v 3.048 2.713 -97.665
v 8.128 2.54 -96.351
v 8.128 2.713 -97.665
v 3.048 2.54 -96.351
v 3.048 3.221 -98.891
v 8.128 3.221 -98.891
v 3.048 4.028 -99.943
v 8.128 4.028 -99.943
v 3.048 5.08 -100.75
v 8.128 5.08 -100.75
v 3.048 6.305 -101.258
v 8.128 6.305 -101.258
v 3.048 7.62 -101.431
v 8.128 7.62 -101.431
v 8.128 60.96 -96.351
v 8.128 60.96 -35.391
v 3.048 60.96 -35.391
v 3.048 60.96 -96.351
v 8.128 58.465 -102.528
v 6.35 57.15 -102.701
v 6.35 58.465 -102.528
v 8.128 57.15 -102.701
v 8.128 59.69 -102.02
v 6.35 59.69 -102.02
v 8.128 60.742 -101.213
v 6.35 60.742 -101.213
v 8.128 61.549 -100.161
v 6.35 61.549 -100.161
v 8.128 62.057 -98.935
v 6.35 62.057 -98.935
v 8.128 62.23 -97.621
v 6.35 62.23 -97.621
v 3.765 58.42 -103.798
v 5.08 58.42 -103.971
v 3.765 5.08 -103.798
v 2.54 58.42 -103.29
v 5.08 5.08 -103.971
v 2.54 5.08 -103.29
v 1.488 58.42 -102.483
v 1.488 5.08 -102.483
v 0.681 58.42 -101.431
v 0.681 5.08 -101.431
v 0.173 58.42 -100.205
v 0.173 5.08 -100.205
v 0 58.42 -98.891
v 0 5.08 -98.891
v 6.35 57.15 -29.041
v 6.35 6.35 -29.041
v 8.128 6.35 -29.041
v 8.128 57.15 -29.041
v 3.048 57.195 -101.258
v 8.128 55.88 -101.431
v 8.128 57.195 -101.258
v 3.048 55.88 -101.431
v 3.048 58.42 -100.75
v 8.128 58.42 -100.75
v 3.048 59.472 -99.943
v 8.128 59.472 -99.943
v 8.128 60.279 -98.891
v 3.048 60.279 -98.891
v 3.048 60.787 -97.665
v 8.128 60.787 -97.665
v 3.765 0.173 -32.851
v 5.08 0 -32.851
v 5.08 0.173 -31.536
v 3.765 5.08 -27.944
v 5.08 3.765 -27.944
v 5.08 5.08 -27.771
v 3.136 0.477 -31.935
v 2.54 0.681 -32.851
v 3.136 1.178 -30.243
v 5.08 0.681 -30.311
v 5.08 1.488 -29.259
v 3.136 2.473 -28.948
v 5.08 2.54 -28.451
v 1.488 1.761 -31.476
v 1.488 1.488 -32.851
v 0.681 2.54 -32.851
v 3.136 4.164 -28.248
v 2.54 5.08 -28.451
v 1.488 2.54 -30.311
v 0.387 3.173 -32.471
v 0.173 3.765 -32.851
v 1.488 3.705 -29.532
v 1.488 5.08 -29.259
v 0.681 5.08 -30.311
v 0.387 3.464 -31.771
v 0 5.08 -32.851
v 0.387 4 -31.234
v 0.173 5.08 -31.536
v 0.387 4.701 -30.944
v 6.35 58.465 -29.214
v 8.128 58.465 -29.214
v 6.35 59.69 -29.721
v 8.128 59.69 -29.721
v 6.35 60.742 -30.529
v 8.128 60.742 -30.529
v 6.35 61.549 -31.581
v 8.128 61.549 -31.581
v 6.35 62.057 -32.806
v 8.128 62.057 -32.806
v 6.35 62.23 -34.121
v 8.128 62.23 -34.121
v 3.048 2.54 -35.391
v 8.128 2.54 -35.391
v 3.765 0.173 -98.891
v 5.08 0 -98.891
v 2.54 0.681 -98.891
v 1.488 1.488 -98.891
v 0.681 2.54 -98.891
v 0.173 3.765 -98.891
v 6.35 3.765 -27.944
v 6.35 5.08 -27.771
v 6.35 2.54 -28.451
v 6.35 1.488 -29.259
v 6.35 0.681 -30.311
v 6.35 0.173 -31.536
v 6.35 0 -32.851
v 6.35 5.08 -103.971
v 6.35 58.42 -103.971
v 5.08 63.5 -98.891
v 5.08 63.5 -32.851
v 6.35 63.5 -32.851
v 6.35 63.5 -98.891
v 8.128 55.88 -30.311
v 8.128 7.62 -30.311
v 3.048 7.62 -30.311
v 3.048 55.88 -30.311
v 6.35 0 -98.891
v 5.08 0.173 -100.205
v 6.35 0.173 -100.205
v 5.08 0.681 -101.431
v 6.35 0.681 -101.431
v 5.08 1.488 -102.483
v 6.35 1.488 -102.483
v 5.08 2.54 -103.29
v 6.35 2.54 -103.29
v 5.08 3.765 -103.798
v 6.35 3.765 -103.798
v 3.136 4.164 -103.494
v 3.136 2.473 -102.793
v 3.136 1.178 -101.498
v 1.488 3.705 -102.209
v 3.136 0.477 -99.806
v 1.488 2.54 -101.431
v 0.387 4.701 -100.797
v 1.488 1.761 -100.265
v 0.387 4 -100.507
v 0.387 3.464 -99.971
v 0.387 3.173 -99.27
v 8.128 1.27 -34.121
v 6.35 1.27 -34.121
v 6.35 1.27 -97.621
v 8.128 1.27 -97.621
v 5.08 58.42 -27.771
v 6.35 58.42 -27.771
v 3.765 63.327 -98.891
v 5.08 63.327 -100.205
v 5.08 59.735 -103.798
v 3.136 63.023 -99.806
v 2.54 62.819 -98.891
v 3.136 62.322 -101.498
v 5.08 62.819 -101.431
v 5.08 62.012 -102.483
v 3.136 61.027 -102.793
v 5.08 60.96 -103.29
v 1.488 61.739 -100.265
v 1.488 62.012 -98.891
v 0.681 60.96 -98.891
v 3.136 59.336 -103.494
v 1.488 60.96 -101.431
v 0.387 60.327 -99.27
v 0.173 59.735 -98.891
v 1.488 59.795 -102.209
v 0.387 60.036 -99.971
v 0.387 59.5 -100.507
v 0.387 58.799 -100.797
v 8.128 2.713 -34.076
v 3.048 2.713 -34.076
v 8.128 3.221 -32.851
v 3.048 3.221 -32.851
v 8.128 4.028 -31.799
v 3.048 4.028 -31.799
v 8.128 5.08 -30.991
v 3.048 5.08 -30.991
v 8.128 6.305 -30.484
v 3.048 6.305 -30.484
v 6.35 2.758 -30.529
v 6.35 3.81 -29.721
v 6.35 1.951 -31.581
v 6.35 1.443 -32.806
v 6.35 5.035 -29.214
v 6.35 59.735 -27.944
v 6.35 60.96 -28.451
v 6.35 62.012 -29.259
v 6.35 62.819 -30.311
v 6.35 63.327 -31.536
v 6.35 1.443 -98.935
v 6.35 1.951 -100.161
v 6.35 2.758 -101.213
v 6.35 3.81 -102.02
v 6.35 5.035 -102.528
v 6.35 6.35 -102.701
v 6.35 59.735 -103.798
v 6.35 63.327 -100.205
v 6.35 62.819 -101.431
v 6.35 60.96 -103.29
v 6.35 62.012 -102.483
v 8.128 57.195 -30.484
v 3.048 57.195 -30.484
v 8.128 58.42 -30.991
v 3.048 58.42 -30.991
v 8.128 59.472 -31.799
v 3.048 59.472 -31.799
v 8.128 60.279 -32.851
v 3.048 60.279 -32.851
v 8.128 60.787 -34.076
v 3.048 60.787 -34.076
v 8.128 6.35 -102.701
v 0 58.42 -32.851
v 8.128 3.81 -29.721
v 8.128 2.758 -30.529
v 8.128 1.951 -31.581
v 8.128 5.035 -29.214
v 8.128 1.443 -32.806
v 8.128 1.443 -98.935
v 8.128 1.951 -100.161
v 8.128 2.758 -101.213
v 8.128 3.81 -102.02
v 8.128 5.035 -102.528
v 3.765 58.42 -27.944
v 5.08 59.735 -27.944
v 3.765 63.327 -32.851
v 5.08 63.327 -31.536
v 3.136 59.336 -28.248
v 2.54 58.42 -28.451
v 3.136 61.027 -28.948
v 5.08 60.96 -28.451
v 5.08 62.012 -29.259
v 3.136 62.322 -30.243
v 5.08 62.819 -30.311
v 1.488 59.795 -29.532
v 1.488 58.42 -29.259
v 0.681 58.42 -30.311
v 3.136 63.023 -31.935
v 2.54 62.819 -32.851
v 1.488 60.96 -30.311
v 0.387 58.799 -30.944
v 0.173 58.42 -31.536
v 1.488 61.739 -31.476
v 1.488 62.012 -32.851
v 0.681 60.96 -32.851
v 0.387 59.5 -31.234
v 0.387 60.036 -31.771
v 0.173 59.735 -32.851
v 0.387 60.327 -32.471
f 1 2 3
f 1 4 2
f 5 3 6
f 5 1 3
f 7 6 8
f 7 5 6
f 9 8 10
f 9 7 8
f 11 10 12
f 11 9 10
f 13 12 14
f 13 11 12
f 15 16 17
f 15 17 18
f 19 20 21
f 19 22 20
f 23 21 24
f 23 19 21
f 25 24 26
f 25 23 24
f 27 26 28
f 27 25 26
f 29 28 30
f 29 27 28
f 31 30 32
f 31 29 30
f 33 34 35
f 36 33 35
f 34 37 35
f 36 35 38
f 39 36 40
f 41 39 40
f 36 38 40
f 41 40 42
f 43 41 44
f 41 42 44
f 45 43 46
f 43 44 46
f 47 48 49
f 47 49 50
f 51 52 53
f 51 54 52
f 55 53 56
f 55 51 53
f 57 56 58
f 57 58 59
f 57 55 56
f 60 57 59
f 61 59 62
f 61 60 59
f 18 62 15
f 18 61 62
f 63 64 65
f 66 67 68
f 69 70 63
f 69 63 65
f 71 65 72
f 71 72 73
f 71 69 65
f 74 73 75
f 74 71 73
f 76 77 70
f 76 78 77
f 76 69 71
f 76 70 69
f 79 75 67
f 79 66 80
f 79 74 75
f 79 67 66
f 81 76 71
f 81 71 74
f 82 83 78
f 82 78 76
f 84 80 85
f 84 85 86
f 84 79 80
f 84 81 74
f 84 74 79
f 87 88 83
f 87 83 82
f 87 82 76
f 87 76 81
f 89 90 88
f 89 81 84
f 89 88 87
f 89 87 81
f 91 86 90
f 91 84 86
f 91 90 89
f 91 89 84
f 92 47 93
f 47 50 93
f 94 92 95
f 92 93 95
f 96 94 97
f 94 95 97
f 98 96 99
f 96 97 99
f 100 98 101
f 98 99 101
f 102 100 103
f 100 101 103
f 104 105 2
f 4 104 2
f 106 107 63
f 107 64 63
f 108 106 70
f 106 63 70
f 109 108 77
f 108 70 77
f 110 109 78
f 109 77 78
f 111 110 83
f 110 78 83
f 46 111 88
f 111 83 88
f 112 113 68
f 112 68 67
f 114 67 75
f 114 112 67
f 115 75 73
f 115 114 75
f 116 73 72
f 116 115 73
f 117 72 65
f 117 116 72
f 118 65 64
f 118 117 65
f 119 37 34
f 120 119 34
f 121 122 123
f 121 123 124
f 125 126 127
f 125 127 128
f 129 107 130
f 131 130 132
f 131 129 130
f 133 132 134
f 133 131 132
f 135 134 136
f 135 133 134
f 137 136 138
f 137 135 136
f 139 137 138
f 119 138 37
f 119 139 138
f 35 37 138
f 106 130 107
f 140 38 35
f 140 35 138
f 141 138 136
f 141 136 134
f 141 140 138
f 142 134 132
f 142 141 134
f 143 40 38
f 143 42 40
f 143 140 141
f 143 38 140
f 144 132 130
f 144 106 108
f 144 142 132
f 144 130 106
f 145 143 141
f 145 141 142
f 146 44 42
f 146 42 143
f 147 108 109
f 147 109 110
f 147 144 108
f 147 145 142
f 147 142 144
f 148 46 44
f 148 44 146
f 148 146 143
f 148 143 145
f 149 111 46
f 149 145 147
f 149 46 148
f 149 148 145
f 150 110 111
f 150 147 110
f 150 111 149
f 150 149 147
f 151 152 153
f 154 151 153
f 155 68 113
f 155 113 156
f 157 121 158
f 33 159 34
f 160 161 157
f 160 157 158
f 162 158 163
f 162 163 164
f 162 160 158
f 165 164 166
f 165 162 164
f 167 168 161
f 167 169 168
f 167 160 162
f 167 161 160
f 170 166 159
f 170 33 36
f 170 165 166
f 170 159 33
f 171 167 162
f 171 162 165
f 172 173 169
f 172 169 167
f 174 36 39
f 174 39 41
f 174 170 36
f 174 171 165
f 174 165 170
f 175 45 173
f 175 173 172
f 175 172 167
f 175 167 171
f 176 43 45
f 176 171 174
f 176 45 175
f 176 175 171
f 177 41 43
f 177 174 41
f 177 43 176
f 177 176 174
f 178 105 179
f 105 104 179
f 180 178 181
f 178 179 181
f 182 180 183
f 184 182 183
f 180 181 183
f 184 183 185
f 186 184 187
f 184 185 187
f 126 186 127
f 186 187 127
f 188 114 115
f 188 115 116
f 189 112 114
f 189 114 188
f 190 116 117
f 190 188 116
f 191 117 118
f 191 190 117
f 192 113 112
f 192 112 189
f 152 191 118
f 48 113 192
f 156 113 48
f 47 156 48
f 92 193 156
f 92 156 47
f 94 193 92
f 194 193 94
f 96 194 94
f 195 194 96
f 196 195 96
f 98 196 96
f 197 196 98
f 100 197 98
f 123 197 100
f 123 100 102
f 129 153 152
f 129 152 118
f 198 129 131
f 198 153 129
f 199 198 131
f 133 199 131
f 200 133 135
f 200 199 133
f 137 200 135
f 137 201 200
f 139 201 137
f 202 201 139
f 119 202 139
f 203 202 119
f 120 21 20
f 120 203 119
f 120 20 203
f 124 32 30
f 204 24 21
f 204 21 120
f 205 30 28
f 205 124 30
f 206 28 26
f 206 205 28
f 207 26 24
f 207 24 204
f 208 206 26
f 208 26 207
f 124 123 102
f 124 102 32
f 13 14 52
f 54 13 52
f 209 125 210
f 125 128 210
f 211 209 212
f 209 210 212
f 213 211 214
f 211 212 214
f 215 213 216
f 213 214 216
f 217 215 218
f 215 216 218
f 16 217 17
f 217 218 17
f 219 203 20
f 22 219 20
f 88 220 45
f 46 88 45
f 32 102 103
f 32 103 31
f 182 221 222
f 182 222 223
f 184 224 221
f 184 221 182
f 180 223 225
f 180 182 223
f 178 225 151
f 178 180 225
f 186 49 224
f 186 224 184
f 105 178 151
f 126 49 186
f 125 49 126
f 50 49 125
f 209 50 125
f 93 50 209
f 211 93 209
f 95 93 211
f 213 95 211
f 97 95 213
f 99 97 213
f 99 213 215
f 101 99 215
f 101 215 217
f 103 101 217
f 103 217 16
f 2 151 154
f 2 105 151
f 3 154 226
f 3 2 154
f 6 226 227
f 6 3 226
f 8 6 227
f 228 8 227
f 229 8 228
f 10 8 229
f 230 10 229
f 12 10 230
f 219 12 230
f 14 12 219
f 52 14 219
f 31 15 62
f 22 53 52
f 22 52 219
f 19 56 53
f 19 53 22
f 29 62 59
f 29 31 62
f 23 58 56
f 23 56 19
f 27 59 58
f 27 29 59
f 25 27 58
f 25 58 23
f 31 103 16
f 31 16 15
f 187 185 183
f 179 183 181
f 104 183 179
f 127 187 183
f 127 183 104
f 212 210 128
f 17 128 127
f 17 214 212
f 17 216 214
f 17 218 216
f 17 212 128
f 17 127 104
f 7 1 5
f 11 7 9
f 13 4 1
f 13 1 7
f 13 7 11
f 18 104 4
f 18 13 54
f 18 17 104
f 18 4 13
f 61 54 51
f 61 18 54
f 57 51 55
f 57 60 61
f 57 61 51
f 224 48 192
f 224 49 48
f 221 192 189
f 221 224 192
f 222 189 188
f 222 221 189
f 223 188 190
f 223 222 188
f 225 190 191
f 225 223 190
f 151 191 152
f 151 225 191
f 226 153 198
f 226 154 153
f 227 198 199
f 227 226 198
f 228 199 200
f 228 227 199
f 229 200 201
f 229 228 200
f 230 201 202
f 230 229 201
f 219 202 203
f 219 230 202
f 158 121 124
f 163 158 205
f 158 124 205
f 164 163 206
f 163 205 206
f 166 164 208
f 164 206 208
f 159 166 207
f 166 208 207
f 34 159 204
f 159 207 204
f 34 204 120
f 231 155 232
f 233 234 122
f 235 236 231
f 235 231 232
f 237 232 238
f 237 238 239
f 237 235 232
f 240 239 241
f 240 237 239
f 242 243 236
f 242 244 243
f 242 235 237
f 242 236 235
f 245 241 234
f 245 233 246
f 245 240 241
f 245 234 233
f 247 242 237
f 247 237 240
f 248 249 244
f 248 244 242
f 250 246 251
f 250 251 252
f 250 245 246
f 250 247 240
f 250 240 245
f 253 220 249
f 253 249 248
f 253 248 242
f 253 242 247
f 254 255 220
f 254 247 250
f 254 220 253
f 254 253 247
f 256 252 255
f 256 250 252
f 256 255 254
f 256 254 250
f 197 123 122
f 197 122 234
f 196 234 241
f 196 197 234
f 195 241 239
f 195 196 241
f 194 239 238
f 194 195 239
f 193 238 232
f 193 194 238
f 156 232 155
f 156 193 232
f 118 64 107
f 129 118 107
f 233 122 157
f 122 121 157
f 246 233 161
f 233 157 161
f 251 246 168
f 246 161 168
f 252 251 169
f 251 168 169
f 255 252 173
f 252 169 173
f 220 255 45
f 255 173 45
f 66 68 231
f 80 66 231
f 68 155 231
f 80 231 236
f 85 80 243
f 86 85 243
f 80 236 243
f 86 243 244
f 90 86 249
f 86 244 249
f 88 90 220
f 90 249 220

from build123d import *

# Parameters (mm, degrees)
SKETCH5_W           = 76.2
SKETCH5_H           = 63.5
BOSS_EXTRUDE2_DEPTH = 6.35
SKETCH6_W           = 73.66
SKETCH6_H           = 60.96
BOSS_EXTRUDE3_DEPTH = 1.778
SKETCH7_W           = 71.12
SKETCH7_H           = 58.42
CUT_EXTRUDE2_DEPTH  = 5.08
FILLET7_R           = 5.08
FILLET8_R           = 5.08
FILLET9_R           = 5.08
FILLET10_R          = 5.08
FILLET11_R          = 5.08
FILLET12_R          = 5.08
FILLET13_R          = 5.08


with BuildPart() as part:
    # Sketch5 → Boss-Extrude2 (new body)
    with BuildSketch(Plane(origin=(0, 0, 0), x_dir=(0, 0, -1), z_dir=(1, 0, 0))):
        with Locations((65.870666667, 31.75)):
            Rectangle(SKETCH5_W, SKETCH5_H)
    extrude(amount=BOSS_EXTRUDE2_DEPTH)

    # Sketch6 → Boss-Extrude3 (add)
    with BuildSketch(Plane(origin=(6.35, 0, 0), x_dir=(0, 0, -1), z_dir=(1, 0, 0))):
        with Locations((65.870666667, 31.75)):
            Rectangle(SKETCH6_W, SKETCH6_H)
    extrude(amount=BOSS_EXTRUDE3_DEPTH)

    # Sketch7 → Cut-Extrude2 (cut)
    with BuildSketch(Plane(origin=(8.128, 0, 0), x_dir=(0, 0, -1), z_dir=(1, 0, 0))):
        with Locations((65.870666667, 31.75)):
            Rectangle(SKETCH7_W, SKETCH7_H)
    extrude(amount=-CUT_EXTRUDE2_DEPTH, mode=Mode.SUBTRACT)

    # Fillet7
    fillet7_edges = [part.edges().sort_by_distance(p)[0] for p in [
        (5.588, 2.54, -30.310666667),
        (5.588, 2.54, -101.430666667),
    ]]
    fillet(fillet7_edges, radius=FILLET7_R)

    # Fillet8
    fillet8_edges = [part.edges().sort_by_distance(p)[0] for p in [
        (5.588, 60.96, -30.310666667),
        (5.588, 60.96, -101.430666667),
    ]]
    fillet(fillet8_edges, radius=FILLET8_R)

    # Fillet9
    fillet9_edges = [part.edges().sort_by_distance(p)[0] for p in [
        (7.239, 1.27, -29.040666667),
    ]]
    fillet(fillet9_edges, radius=FILLET9_R)

    # Fillet10
    fillet10_edges = [part.edges().sort_by_distance(p)[0] for p in [
        (3.175, 0, -27.770666667),
    ]]
    fillet(fillet10_edges, radius=FILLET10_R)

    # Fillet11
    fillet11_edges = [part.edges().sort_by_distance(p)[0] for p in [
        (7.239, 1.27, -102.700666667),
        (7.239, 62.23, -102.700666667),
        (3.175, 63.5, -103.970666667),
        (3.175, 0, -103.970666667),
    ]]
    fillet(fillet11_edges, radius=FILLET11_R)

    # Fillet12
    fillet12_edges = [part.edges().sort_by_distance(p)[0] for p in [
        (7.239, 62.23, -29.040666667),
        (3.175, 63.5, -27.770666667),
    ]]
    fillet(fillet12_edges, radius=FILLET12_R)

    # Fillet13
    fillet13_edges = [part.edges().sort_by_distance(p)[0] for p in [
        (0, 31.75, -27.770666667),
        (0, 62.012102448, -29.258564218),
        (0, 0, -65.870666667),
        (0, 1.487897552, -29.258564218),
        (0, 63.5, -65.870666667),
        (0, 31.75, -103.970666667),
        (0, 1.487897552, -102.482769115),
        (0, 62.012102448, -102.482769115),
    ]]
    fillet(fillet13_edges, radius=FILLET13_R)


solid = part.part
